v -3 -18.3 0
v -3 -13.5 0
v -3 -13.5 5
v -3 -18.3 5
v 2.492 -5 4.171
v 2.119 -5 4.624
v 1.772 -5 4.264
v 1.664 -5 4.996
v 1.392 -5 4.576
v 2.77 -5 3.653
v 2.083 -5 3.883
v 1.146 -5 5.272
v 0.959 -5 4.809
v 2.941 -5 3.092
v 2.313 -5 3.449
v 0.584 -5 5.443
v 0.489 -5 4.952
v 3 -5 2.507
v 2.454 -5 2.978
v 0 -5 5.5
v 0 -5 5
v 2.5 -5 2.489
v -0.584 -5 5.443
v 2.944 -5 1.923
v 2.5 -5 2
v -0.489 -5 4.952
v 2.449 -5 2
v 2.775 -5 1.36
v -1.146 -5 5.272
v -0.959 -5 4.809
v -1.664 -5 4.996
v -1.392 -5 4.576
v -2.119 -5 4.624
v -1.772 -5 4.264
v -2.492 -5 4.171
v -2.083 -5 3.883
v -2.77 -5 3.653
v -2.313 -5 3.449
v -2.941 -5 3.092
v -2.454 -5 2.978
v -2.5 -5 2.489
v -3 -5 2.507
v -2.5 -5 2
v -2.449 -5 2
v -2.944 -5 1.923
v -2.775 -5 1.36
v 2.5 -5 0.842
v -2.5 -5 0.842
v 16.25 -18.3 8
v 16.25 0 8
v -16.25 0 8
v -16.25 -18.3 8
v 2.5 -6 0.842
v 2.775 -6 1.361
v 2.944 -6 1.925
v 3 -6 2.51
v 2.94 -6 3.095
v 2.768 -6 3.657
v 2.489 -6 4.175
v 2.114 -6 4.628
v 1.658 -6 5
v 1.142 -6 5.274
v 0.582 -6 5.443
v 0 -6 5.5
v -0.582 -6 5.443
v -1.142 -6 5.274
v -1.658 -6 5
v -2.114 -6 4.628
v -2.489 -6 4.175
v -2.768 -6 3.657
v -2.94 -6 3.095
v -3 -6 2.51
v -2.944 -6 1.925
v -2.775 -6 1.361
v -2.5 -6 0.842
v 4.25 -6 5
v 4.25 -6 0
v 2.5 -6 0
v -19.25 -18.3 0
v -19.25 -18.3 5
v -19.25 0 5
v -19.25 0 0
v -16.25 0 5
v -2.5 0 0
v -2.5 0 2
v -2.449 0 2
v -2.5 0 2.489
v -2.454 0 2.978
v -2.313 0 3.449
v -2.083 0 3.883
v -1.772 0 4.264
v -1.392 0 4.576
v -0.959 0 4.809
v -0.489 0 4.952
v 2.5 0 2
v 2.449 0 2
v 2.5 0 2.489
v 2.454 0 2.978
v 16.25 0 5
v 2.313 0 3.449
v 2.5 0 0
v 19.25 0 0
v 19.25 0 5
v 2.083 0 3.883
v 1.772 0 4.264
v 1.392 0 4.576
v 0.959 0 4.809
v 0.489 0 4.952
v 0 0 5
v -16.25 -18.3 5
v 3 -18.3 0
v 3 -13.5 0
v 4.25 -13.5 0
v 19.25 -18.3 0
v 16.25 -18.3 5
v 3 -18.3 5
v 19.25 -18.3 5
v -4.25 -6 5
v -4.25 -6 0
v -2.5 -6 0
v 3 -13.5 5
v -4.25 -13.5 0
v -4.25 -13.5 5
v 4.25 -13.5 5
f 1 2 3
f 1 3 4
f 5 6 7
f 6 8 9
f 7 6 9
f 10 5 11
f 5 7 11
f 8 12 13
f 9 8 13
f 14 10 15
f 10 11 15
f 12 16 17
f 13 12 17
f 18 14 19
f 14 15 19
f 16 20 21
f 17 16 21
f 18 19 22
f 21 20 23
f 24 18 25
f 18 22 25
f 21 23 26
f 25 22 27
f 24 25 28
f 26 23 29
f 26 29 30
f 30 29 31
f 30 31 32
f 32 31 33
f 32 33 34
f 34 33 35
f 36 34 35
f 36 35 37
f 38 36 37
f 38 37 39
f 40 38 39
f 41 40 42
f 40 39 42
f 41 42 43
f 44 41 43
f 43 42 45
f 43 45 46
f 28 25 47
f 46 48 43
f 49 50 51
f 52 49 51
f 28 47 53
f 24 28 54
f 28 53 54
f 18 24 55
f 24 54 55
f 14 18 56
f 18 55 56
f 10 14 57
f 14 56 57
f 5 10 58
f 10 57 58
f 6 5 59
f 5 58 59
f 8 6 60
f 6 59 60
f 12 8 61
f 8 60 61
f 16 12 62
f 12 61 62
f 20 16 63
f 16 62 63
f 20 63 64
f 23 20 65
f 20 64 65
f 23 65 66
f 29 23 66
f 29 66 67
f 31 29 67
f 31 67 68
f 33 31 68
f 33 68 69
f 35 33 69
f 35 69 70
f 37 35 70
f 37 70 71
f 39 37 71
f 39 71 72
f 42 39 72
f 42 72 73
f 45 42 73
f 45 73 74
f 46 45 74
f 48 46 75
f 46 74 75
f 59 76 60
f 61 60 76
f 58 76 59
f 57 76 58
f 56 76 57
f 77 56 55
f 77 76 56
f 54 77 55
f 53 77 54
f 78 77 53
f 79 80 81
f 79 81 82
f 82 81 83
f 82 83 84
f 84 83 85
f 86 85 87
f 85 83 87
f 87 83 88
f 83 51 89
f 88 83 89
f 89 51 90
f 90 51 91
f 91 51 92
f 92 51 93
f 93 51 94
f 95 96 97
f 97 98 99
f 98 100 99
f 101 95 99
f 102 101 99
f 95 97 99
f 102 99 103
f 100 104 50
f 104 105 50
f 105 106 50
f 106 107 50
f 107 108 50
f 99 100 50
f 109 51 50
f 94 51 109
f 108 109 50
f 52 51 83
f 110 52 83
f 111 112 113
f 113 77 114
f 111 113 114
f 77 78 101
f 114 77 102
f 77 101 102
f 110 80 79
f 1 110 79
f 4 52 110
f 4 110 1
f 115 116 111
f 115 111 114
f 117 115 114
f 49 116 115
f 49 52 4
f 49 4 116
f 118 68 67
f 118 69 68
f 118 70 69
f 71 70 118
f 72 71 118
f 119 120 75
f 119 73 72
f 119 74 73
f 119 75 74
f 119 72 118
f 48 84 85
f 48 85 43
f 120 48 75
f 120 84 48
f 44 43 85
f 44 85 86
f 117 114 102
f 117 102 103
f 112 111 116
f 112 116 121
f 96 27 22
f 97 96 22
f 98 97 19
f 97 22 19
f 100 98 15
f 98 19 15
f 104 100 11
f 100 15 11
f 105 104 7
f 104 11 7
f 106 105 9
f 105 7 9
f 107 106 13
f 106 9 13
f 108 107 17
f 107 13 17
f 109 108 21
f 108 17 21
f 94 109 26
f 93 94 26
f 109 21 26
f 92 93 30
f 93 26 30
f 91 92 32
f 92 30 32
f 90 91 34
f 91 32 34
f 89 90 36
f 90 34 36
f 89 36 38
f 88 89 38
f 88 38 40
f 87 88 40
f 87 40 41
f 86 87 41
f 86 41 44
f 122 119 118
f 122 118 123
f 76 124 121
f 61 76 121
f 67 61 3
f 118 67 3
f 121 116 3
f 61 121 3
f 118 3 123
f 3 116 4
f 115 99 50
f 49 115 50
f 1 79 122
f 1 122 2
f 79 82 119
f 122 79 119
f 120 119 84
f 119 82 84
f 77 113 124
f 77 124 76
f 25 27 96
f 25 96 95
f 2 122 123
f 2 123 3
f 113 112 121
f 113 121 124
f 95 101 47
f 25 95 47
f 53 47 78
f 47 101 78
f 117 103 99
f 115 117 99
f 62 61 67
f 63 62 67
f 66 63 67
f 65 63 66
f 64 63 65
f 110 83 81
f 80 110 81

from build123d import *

# Parameters (mm, degrees)
PAD_DEPTH       = 18.3
POCKET_DEPTH    = 5
SKETCH004_W     = 5
SKETCH004_H     = 6
POCKET001_DEPTH = 2


with BuildPart() as part:
    # Sketch → Pad (new body)
    with BuildSketch(Plane.XZ):
        Polygon((-19.25, 0), (19.25, 0), (19.25, 5), (16.25, 5), (16.25, 8), (-16.25, 8), (-16.25, 5), (-19.25, 5), align=None)
    extrude(amount=PAD_DEPTH)

    # Sketch001 (on Face1 of Pad) → Pocket (cut)
    with BuildSketch(Plane(origin=(0, 0, 0), x_dir=(1, 0, 0), z_dir=(0, 0, -1))):
        Polygon((4.25, 13.5), (4.25, 6), (-4.25, 6), (-4.25, 13.5), (-3, 13.5), (-3, 18.5), (3, 18.5), (3, 13.5), align=None)
    extrude(amount=-POCKET_DEPTH, mode=Mode.SUBTRACT)

    # Sketch003 → Groove (revolve, cut)
    with BuildSketch(Plane.YZ):
        Polygon((0, 2.5), (0, 5), (-5, 5), (-5, 5.5), (-6, 5.5), (-6, 2.5), align=None)
    revolve(axis=Axis((0, 0, 2.5), (0, -1, 0)), mode=Mode.SUBTRACT)

    # Sketch004 (on Face1 of Groove) → Pocket001 (cut)
    with BuildSketch(Plane(origin=(0, 0, 0), x_dir=(1, 0, 0), z_dir=(0, 0, -1))):
        with Locations((0, 3)):
            Rectangle(SKETCH004_W, SKETCH004_H)
    extrude(amount=-POCKET001_DEPTH, mode=Mode.SUBTRACT)


solid = part.part
